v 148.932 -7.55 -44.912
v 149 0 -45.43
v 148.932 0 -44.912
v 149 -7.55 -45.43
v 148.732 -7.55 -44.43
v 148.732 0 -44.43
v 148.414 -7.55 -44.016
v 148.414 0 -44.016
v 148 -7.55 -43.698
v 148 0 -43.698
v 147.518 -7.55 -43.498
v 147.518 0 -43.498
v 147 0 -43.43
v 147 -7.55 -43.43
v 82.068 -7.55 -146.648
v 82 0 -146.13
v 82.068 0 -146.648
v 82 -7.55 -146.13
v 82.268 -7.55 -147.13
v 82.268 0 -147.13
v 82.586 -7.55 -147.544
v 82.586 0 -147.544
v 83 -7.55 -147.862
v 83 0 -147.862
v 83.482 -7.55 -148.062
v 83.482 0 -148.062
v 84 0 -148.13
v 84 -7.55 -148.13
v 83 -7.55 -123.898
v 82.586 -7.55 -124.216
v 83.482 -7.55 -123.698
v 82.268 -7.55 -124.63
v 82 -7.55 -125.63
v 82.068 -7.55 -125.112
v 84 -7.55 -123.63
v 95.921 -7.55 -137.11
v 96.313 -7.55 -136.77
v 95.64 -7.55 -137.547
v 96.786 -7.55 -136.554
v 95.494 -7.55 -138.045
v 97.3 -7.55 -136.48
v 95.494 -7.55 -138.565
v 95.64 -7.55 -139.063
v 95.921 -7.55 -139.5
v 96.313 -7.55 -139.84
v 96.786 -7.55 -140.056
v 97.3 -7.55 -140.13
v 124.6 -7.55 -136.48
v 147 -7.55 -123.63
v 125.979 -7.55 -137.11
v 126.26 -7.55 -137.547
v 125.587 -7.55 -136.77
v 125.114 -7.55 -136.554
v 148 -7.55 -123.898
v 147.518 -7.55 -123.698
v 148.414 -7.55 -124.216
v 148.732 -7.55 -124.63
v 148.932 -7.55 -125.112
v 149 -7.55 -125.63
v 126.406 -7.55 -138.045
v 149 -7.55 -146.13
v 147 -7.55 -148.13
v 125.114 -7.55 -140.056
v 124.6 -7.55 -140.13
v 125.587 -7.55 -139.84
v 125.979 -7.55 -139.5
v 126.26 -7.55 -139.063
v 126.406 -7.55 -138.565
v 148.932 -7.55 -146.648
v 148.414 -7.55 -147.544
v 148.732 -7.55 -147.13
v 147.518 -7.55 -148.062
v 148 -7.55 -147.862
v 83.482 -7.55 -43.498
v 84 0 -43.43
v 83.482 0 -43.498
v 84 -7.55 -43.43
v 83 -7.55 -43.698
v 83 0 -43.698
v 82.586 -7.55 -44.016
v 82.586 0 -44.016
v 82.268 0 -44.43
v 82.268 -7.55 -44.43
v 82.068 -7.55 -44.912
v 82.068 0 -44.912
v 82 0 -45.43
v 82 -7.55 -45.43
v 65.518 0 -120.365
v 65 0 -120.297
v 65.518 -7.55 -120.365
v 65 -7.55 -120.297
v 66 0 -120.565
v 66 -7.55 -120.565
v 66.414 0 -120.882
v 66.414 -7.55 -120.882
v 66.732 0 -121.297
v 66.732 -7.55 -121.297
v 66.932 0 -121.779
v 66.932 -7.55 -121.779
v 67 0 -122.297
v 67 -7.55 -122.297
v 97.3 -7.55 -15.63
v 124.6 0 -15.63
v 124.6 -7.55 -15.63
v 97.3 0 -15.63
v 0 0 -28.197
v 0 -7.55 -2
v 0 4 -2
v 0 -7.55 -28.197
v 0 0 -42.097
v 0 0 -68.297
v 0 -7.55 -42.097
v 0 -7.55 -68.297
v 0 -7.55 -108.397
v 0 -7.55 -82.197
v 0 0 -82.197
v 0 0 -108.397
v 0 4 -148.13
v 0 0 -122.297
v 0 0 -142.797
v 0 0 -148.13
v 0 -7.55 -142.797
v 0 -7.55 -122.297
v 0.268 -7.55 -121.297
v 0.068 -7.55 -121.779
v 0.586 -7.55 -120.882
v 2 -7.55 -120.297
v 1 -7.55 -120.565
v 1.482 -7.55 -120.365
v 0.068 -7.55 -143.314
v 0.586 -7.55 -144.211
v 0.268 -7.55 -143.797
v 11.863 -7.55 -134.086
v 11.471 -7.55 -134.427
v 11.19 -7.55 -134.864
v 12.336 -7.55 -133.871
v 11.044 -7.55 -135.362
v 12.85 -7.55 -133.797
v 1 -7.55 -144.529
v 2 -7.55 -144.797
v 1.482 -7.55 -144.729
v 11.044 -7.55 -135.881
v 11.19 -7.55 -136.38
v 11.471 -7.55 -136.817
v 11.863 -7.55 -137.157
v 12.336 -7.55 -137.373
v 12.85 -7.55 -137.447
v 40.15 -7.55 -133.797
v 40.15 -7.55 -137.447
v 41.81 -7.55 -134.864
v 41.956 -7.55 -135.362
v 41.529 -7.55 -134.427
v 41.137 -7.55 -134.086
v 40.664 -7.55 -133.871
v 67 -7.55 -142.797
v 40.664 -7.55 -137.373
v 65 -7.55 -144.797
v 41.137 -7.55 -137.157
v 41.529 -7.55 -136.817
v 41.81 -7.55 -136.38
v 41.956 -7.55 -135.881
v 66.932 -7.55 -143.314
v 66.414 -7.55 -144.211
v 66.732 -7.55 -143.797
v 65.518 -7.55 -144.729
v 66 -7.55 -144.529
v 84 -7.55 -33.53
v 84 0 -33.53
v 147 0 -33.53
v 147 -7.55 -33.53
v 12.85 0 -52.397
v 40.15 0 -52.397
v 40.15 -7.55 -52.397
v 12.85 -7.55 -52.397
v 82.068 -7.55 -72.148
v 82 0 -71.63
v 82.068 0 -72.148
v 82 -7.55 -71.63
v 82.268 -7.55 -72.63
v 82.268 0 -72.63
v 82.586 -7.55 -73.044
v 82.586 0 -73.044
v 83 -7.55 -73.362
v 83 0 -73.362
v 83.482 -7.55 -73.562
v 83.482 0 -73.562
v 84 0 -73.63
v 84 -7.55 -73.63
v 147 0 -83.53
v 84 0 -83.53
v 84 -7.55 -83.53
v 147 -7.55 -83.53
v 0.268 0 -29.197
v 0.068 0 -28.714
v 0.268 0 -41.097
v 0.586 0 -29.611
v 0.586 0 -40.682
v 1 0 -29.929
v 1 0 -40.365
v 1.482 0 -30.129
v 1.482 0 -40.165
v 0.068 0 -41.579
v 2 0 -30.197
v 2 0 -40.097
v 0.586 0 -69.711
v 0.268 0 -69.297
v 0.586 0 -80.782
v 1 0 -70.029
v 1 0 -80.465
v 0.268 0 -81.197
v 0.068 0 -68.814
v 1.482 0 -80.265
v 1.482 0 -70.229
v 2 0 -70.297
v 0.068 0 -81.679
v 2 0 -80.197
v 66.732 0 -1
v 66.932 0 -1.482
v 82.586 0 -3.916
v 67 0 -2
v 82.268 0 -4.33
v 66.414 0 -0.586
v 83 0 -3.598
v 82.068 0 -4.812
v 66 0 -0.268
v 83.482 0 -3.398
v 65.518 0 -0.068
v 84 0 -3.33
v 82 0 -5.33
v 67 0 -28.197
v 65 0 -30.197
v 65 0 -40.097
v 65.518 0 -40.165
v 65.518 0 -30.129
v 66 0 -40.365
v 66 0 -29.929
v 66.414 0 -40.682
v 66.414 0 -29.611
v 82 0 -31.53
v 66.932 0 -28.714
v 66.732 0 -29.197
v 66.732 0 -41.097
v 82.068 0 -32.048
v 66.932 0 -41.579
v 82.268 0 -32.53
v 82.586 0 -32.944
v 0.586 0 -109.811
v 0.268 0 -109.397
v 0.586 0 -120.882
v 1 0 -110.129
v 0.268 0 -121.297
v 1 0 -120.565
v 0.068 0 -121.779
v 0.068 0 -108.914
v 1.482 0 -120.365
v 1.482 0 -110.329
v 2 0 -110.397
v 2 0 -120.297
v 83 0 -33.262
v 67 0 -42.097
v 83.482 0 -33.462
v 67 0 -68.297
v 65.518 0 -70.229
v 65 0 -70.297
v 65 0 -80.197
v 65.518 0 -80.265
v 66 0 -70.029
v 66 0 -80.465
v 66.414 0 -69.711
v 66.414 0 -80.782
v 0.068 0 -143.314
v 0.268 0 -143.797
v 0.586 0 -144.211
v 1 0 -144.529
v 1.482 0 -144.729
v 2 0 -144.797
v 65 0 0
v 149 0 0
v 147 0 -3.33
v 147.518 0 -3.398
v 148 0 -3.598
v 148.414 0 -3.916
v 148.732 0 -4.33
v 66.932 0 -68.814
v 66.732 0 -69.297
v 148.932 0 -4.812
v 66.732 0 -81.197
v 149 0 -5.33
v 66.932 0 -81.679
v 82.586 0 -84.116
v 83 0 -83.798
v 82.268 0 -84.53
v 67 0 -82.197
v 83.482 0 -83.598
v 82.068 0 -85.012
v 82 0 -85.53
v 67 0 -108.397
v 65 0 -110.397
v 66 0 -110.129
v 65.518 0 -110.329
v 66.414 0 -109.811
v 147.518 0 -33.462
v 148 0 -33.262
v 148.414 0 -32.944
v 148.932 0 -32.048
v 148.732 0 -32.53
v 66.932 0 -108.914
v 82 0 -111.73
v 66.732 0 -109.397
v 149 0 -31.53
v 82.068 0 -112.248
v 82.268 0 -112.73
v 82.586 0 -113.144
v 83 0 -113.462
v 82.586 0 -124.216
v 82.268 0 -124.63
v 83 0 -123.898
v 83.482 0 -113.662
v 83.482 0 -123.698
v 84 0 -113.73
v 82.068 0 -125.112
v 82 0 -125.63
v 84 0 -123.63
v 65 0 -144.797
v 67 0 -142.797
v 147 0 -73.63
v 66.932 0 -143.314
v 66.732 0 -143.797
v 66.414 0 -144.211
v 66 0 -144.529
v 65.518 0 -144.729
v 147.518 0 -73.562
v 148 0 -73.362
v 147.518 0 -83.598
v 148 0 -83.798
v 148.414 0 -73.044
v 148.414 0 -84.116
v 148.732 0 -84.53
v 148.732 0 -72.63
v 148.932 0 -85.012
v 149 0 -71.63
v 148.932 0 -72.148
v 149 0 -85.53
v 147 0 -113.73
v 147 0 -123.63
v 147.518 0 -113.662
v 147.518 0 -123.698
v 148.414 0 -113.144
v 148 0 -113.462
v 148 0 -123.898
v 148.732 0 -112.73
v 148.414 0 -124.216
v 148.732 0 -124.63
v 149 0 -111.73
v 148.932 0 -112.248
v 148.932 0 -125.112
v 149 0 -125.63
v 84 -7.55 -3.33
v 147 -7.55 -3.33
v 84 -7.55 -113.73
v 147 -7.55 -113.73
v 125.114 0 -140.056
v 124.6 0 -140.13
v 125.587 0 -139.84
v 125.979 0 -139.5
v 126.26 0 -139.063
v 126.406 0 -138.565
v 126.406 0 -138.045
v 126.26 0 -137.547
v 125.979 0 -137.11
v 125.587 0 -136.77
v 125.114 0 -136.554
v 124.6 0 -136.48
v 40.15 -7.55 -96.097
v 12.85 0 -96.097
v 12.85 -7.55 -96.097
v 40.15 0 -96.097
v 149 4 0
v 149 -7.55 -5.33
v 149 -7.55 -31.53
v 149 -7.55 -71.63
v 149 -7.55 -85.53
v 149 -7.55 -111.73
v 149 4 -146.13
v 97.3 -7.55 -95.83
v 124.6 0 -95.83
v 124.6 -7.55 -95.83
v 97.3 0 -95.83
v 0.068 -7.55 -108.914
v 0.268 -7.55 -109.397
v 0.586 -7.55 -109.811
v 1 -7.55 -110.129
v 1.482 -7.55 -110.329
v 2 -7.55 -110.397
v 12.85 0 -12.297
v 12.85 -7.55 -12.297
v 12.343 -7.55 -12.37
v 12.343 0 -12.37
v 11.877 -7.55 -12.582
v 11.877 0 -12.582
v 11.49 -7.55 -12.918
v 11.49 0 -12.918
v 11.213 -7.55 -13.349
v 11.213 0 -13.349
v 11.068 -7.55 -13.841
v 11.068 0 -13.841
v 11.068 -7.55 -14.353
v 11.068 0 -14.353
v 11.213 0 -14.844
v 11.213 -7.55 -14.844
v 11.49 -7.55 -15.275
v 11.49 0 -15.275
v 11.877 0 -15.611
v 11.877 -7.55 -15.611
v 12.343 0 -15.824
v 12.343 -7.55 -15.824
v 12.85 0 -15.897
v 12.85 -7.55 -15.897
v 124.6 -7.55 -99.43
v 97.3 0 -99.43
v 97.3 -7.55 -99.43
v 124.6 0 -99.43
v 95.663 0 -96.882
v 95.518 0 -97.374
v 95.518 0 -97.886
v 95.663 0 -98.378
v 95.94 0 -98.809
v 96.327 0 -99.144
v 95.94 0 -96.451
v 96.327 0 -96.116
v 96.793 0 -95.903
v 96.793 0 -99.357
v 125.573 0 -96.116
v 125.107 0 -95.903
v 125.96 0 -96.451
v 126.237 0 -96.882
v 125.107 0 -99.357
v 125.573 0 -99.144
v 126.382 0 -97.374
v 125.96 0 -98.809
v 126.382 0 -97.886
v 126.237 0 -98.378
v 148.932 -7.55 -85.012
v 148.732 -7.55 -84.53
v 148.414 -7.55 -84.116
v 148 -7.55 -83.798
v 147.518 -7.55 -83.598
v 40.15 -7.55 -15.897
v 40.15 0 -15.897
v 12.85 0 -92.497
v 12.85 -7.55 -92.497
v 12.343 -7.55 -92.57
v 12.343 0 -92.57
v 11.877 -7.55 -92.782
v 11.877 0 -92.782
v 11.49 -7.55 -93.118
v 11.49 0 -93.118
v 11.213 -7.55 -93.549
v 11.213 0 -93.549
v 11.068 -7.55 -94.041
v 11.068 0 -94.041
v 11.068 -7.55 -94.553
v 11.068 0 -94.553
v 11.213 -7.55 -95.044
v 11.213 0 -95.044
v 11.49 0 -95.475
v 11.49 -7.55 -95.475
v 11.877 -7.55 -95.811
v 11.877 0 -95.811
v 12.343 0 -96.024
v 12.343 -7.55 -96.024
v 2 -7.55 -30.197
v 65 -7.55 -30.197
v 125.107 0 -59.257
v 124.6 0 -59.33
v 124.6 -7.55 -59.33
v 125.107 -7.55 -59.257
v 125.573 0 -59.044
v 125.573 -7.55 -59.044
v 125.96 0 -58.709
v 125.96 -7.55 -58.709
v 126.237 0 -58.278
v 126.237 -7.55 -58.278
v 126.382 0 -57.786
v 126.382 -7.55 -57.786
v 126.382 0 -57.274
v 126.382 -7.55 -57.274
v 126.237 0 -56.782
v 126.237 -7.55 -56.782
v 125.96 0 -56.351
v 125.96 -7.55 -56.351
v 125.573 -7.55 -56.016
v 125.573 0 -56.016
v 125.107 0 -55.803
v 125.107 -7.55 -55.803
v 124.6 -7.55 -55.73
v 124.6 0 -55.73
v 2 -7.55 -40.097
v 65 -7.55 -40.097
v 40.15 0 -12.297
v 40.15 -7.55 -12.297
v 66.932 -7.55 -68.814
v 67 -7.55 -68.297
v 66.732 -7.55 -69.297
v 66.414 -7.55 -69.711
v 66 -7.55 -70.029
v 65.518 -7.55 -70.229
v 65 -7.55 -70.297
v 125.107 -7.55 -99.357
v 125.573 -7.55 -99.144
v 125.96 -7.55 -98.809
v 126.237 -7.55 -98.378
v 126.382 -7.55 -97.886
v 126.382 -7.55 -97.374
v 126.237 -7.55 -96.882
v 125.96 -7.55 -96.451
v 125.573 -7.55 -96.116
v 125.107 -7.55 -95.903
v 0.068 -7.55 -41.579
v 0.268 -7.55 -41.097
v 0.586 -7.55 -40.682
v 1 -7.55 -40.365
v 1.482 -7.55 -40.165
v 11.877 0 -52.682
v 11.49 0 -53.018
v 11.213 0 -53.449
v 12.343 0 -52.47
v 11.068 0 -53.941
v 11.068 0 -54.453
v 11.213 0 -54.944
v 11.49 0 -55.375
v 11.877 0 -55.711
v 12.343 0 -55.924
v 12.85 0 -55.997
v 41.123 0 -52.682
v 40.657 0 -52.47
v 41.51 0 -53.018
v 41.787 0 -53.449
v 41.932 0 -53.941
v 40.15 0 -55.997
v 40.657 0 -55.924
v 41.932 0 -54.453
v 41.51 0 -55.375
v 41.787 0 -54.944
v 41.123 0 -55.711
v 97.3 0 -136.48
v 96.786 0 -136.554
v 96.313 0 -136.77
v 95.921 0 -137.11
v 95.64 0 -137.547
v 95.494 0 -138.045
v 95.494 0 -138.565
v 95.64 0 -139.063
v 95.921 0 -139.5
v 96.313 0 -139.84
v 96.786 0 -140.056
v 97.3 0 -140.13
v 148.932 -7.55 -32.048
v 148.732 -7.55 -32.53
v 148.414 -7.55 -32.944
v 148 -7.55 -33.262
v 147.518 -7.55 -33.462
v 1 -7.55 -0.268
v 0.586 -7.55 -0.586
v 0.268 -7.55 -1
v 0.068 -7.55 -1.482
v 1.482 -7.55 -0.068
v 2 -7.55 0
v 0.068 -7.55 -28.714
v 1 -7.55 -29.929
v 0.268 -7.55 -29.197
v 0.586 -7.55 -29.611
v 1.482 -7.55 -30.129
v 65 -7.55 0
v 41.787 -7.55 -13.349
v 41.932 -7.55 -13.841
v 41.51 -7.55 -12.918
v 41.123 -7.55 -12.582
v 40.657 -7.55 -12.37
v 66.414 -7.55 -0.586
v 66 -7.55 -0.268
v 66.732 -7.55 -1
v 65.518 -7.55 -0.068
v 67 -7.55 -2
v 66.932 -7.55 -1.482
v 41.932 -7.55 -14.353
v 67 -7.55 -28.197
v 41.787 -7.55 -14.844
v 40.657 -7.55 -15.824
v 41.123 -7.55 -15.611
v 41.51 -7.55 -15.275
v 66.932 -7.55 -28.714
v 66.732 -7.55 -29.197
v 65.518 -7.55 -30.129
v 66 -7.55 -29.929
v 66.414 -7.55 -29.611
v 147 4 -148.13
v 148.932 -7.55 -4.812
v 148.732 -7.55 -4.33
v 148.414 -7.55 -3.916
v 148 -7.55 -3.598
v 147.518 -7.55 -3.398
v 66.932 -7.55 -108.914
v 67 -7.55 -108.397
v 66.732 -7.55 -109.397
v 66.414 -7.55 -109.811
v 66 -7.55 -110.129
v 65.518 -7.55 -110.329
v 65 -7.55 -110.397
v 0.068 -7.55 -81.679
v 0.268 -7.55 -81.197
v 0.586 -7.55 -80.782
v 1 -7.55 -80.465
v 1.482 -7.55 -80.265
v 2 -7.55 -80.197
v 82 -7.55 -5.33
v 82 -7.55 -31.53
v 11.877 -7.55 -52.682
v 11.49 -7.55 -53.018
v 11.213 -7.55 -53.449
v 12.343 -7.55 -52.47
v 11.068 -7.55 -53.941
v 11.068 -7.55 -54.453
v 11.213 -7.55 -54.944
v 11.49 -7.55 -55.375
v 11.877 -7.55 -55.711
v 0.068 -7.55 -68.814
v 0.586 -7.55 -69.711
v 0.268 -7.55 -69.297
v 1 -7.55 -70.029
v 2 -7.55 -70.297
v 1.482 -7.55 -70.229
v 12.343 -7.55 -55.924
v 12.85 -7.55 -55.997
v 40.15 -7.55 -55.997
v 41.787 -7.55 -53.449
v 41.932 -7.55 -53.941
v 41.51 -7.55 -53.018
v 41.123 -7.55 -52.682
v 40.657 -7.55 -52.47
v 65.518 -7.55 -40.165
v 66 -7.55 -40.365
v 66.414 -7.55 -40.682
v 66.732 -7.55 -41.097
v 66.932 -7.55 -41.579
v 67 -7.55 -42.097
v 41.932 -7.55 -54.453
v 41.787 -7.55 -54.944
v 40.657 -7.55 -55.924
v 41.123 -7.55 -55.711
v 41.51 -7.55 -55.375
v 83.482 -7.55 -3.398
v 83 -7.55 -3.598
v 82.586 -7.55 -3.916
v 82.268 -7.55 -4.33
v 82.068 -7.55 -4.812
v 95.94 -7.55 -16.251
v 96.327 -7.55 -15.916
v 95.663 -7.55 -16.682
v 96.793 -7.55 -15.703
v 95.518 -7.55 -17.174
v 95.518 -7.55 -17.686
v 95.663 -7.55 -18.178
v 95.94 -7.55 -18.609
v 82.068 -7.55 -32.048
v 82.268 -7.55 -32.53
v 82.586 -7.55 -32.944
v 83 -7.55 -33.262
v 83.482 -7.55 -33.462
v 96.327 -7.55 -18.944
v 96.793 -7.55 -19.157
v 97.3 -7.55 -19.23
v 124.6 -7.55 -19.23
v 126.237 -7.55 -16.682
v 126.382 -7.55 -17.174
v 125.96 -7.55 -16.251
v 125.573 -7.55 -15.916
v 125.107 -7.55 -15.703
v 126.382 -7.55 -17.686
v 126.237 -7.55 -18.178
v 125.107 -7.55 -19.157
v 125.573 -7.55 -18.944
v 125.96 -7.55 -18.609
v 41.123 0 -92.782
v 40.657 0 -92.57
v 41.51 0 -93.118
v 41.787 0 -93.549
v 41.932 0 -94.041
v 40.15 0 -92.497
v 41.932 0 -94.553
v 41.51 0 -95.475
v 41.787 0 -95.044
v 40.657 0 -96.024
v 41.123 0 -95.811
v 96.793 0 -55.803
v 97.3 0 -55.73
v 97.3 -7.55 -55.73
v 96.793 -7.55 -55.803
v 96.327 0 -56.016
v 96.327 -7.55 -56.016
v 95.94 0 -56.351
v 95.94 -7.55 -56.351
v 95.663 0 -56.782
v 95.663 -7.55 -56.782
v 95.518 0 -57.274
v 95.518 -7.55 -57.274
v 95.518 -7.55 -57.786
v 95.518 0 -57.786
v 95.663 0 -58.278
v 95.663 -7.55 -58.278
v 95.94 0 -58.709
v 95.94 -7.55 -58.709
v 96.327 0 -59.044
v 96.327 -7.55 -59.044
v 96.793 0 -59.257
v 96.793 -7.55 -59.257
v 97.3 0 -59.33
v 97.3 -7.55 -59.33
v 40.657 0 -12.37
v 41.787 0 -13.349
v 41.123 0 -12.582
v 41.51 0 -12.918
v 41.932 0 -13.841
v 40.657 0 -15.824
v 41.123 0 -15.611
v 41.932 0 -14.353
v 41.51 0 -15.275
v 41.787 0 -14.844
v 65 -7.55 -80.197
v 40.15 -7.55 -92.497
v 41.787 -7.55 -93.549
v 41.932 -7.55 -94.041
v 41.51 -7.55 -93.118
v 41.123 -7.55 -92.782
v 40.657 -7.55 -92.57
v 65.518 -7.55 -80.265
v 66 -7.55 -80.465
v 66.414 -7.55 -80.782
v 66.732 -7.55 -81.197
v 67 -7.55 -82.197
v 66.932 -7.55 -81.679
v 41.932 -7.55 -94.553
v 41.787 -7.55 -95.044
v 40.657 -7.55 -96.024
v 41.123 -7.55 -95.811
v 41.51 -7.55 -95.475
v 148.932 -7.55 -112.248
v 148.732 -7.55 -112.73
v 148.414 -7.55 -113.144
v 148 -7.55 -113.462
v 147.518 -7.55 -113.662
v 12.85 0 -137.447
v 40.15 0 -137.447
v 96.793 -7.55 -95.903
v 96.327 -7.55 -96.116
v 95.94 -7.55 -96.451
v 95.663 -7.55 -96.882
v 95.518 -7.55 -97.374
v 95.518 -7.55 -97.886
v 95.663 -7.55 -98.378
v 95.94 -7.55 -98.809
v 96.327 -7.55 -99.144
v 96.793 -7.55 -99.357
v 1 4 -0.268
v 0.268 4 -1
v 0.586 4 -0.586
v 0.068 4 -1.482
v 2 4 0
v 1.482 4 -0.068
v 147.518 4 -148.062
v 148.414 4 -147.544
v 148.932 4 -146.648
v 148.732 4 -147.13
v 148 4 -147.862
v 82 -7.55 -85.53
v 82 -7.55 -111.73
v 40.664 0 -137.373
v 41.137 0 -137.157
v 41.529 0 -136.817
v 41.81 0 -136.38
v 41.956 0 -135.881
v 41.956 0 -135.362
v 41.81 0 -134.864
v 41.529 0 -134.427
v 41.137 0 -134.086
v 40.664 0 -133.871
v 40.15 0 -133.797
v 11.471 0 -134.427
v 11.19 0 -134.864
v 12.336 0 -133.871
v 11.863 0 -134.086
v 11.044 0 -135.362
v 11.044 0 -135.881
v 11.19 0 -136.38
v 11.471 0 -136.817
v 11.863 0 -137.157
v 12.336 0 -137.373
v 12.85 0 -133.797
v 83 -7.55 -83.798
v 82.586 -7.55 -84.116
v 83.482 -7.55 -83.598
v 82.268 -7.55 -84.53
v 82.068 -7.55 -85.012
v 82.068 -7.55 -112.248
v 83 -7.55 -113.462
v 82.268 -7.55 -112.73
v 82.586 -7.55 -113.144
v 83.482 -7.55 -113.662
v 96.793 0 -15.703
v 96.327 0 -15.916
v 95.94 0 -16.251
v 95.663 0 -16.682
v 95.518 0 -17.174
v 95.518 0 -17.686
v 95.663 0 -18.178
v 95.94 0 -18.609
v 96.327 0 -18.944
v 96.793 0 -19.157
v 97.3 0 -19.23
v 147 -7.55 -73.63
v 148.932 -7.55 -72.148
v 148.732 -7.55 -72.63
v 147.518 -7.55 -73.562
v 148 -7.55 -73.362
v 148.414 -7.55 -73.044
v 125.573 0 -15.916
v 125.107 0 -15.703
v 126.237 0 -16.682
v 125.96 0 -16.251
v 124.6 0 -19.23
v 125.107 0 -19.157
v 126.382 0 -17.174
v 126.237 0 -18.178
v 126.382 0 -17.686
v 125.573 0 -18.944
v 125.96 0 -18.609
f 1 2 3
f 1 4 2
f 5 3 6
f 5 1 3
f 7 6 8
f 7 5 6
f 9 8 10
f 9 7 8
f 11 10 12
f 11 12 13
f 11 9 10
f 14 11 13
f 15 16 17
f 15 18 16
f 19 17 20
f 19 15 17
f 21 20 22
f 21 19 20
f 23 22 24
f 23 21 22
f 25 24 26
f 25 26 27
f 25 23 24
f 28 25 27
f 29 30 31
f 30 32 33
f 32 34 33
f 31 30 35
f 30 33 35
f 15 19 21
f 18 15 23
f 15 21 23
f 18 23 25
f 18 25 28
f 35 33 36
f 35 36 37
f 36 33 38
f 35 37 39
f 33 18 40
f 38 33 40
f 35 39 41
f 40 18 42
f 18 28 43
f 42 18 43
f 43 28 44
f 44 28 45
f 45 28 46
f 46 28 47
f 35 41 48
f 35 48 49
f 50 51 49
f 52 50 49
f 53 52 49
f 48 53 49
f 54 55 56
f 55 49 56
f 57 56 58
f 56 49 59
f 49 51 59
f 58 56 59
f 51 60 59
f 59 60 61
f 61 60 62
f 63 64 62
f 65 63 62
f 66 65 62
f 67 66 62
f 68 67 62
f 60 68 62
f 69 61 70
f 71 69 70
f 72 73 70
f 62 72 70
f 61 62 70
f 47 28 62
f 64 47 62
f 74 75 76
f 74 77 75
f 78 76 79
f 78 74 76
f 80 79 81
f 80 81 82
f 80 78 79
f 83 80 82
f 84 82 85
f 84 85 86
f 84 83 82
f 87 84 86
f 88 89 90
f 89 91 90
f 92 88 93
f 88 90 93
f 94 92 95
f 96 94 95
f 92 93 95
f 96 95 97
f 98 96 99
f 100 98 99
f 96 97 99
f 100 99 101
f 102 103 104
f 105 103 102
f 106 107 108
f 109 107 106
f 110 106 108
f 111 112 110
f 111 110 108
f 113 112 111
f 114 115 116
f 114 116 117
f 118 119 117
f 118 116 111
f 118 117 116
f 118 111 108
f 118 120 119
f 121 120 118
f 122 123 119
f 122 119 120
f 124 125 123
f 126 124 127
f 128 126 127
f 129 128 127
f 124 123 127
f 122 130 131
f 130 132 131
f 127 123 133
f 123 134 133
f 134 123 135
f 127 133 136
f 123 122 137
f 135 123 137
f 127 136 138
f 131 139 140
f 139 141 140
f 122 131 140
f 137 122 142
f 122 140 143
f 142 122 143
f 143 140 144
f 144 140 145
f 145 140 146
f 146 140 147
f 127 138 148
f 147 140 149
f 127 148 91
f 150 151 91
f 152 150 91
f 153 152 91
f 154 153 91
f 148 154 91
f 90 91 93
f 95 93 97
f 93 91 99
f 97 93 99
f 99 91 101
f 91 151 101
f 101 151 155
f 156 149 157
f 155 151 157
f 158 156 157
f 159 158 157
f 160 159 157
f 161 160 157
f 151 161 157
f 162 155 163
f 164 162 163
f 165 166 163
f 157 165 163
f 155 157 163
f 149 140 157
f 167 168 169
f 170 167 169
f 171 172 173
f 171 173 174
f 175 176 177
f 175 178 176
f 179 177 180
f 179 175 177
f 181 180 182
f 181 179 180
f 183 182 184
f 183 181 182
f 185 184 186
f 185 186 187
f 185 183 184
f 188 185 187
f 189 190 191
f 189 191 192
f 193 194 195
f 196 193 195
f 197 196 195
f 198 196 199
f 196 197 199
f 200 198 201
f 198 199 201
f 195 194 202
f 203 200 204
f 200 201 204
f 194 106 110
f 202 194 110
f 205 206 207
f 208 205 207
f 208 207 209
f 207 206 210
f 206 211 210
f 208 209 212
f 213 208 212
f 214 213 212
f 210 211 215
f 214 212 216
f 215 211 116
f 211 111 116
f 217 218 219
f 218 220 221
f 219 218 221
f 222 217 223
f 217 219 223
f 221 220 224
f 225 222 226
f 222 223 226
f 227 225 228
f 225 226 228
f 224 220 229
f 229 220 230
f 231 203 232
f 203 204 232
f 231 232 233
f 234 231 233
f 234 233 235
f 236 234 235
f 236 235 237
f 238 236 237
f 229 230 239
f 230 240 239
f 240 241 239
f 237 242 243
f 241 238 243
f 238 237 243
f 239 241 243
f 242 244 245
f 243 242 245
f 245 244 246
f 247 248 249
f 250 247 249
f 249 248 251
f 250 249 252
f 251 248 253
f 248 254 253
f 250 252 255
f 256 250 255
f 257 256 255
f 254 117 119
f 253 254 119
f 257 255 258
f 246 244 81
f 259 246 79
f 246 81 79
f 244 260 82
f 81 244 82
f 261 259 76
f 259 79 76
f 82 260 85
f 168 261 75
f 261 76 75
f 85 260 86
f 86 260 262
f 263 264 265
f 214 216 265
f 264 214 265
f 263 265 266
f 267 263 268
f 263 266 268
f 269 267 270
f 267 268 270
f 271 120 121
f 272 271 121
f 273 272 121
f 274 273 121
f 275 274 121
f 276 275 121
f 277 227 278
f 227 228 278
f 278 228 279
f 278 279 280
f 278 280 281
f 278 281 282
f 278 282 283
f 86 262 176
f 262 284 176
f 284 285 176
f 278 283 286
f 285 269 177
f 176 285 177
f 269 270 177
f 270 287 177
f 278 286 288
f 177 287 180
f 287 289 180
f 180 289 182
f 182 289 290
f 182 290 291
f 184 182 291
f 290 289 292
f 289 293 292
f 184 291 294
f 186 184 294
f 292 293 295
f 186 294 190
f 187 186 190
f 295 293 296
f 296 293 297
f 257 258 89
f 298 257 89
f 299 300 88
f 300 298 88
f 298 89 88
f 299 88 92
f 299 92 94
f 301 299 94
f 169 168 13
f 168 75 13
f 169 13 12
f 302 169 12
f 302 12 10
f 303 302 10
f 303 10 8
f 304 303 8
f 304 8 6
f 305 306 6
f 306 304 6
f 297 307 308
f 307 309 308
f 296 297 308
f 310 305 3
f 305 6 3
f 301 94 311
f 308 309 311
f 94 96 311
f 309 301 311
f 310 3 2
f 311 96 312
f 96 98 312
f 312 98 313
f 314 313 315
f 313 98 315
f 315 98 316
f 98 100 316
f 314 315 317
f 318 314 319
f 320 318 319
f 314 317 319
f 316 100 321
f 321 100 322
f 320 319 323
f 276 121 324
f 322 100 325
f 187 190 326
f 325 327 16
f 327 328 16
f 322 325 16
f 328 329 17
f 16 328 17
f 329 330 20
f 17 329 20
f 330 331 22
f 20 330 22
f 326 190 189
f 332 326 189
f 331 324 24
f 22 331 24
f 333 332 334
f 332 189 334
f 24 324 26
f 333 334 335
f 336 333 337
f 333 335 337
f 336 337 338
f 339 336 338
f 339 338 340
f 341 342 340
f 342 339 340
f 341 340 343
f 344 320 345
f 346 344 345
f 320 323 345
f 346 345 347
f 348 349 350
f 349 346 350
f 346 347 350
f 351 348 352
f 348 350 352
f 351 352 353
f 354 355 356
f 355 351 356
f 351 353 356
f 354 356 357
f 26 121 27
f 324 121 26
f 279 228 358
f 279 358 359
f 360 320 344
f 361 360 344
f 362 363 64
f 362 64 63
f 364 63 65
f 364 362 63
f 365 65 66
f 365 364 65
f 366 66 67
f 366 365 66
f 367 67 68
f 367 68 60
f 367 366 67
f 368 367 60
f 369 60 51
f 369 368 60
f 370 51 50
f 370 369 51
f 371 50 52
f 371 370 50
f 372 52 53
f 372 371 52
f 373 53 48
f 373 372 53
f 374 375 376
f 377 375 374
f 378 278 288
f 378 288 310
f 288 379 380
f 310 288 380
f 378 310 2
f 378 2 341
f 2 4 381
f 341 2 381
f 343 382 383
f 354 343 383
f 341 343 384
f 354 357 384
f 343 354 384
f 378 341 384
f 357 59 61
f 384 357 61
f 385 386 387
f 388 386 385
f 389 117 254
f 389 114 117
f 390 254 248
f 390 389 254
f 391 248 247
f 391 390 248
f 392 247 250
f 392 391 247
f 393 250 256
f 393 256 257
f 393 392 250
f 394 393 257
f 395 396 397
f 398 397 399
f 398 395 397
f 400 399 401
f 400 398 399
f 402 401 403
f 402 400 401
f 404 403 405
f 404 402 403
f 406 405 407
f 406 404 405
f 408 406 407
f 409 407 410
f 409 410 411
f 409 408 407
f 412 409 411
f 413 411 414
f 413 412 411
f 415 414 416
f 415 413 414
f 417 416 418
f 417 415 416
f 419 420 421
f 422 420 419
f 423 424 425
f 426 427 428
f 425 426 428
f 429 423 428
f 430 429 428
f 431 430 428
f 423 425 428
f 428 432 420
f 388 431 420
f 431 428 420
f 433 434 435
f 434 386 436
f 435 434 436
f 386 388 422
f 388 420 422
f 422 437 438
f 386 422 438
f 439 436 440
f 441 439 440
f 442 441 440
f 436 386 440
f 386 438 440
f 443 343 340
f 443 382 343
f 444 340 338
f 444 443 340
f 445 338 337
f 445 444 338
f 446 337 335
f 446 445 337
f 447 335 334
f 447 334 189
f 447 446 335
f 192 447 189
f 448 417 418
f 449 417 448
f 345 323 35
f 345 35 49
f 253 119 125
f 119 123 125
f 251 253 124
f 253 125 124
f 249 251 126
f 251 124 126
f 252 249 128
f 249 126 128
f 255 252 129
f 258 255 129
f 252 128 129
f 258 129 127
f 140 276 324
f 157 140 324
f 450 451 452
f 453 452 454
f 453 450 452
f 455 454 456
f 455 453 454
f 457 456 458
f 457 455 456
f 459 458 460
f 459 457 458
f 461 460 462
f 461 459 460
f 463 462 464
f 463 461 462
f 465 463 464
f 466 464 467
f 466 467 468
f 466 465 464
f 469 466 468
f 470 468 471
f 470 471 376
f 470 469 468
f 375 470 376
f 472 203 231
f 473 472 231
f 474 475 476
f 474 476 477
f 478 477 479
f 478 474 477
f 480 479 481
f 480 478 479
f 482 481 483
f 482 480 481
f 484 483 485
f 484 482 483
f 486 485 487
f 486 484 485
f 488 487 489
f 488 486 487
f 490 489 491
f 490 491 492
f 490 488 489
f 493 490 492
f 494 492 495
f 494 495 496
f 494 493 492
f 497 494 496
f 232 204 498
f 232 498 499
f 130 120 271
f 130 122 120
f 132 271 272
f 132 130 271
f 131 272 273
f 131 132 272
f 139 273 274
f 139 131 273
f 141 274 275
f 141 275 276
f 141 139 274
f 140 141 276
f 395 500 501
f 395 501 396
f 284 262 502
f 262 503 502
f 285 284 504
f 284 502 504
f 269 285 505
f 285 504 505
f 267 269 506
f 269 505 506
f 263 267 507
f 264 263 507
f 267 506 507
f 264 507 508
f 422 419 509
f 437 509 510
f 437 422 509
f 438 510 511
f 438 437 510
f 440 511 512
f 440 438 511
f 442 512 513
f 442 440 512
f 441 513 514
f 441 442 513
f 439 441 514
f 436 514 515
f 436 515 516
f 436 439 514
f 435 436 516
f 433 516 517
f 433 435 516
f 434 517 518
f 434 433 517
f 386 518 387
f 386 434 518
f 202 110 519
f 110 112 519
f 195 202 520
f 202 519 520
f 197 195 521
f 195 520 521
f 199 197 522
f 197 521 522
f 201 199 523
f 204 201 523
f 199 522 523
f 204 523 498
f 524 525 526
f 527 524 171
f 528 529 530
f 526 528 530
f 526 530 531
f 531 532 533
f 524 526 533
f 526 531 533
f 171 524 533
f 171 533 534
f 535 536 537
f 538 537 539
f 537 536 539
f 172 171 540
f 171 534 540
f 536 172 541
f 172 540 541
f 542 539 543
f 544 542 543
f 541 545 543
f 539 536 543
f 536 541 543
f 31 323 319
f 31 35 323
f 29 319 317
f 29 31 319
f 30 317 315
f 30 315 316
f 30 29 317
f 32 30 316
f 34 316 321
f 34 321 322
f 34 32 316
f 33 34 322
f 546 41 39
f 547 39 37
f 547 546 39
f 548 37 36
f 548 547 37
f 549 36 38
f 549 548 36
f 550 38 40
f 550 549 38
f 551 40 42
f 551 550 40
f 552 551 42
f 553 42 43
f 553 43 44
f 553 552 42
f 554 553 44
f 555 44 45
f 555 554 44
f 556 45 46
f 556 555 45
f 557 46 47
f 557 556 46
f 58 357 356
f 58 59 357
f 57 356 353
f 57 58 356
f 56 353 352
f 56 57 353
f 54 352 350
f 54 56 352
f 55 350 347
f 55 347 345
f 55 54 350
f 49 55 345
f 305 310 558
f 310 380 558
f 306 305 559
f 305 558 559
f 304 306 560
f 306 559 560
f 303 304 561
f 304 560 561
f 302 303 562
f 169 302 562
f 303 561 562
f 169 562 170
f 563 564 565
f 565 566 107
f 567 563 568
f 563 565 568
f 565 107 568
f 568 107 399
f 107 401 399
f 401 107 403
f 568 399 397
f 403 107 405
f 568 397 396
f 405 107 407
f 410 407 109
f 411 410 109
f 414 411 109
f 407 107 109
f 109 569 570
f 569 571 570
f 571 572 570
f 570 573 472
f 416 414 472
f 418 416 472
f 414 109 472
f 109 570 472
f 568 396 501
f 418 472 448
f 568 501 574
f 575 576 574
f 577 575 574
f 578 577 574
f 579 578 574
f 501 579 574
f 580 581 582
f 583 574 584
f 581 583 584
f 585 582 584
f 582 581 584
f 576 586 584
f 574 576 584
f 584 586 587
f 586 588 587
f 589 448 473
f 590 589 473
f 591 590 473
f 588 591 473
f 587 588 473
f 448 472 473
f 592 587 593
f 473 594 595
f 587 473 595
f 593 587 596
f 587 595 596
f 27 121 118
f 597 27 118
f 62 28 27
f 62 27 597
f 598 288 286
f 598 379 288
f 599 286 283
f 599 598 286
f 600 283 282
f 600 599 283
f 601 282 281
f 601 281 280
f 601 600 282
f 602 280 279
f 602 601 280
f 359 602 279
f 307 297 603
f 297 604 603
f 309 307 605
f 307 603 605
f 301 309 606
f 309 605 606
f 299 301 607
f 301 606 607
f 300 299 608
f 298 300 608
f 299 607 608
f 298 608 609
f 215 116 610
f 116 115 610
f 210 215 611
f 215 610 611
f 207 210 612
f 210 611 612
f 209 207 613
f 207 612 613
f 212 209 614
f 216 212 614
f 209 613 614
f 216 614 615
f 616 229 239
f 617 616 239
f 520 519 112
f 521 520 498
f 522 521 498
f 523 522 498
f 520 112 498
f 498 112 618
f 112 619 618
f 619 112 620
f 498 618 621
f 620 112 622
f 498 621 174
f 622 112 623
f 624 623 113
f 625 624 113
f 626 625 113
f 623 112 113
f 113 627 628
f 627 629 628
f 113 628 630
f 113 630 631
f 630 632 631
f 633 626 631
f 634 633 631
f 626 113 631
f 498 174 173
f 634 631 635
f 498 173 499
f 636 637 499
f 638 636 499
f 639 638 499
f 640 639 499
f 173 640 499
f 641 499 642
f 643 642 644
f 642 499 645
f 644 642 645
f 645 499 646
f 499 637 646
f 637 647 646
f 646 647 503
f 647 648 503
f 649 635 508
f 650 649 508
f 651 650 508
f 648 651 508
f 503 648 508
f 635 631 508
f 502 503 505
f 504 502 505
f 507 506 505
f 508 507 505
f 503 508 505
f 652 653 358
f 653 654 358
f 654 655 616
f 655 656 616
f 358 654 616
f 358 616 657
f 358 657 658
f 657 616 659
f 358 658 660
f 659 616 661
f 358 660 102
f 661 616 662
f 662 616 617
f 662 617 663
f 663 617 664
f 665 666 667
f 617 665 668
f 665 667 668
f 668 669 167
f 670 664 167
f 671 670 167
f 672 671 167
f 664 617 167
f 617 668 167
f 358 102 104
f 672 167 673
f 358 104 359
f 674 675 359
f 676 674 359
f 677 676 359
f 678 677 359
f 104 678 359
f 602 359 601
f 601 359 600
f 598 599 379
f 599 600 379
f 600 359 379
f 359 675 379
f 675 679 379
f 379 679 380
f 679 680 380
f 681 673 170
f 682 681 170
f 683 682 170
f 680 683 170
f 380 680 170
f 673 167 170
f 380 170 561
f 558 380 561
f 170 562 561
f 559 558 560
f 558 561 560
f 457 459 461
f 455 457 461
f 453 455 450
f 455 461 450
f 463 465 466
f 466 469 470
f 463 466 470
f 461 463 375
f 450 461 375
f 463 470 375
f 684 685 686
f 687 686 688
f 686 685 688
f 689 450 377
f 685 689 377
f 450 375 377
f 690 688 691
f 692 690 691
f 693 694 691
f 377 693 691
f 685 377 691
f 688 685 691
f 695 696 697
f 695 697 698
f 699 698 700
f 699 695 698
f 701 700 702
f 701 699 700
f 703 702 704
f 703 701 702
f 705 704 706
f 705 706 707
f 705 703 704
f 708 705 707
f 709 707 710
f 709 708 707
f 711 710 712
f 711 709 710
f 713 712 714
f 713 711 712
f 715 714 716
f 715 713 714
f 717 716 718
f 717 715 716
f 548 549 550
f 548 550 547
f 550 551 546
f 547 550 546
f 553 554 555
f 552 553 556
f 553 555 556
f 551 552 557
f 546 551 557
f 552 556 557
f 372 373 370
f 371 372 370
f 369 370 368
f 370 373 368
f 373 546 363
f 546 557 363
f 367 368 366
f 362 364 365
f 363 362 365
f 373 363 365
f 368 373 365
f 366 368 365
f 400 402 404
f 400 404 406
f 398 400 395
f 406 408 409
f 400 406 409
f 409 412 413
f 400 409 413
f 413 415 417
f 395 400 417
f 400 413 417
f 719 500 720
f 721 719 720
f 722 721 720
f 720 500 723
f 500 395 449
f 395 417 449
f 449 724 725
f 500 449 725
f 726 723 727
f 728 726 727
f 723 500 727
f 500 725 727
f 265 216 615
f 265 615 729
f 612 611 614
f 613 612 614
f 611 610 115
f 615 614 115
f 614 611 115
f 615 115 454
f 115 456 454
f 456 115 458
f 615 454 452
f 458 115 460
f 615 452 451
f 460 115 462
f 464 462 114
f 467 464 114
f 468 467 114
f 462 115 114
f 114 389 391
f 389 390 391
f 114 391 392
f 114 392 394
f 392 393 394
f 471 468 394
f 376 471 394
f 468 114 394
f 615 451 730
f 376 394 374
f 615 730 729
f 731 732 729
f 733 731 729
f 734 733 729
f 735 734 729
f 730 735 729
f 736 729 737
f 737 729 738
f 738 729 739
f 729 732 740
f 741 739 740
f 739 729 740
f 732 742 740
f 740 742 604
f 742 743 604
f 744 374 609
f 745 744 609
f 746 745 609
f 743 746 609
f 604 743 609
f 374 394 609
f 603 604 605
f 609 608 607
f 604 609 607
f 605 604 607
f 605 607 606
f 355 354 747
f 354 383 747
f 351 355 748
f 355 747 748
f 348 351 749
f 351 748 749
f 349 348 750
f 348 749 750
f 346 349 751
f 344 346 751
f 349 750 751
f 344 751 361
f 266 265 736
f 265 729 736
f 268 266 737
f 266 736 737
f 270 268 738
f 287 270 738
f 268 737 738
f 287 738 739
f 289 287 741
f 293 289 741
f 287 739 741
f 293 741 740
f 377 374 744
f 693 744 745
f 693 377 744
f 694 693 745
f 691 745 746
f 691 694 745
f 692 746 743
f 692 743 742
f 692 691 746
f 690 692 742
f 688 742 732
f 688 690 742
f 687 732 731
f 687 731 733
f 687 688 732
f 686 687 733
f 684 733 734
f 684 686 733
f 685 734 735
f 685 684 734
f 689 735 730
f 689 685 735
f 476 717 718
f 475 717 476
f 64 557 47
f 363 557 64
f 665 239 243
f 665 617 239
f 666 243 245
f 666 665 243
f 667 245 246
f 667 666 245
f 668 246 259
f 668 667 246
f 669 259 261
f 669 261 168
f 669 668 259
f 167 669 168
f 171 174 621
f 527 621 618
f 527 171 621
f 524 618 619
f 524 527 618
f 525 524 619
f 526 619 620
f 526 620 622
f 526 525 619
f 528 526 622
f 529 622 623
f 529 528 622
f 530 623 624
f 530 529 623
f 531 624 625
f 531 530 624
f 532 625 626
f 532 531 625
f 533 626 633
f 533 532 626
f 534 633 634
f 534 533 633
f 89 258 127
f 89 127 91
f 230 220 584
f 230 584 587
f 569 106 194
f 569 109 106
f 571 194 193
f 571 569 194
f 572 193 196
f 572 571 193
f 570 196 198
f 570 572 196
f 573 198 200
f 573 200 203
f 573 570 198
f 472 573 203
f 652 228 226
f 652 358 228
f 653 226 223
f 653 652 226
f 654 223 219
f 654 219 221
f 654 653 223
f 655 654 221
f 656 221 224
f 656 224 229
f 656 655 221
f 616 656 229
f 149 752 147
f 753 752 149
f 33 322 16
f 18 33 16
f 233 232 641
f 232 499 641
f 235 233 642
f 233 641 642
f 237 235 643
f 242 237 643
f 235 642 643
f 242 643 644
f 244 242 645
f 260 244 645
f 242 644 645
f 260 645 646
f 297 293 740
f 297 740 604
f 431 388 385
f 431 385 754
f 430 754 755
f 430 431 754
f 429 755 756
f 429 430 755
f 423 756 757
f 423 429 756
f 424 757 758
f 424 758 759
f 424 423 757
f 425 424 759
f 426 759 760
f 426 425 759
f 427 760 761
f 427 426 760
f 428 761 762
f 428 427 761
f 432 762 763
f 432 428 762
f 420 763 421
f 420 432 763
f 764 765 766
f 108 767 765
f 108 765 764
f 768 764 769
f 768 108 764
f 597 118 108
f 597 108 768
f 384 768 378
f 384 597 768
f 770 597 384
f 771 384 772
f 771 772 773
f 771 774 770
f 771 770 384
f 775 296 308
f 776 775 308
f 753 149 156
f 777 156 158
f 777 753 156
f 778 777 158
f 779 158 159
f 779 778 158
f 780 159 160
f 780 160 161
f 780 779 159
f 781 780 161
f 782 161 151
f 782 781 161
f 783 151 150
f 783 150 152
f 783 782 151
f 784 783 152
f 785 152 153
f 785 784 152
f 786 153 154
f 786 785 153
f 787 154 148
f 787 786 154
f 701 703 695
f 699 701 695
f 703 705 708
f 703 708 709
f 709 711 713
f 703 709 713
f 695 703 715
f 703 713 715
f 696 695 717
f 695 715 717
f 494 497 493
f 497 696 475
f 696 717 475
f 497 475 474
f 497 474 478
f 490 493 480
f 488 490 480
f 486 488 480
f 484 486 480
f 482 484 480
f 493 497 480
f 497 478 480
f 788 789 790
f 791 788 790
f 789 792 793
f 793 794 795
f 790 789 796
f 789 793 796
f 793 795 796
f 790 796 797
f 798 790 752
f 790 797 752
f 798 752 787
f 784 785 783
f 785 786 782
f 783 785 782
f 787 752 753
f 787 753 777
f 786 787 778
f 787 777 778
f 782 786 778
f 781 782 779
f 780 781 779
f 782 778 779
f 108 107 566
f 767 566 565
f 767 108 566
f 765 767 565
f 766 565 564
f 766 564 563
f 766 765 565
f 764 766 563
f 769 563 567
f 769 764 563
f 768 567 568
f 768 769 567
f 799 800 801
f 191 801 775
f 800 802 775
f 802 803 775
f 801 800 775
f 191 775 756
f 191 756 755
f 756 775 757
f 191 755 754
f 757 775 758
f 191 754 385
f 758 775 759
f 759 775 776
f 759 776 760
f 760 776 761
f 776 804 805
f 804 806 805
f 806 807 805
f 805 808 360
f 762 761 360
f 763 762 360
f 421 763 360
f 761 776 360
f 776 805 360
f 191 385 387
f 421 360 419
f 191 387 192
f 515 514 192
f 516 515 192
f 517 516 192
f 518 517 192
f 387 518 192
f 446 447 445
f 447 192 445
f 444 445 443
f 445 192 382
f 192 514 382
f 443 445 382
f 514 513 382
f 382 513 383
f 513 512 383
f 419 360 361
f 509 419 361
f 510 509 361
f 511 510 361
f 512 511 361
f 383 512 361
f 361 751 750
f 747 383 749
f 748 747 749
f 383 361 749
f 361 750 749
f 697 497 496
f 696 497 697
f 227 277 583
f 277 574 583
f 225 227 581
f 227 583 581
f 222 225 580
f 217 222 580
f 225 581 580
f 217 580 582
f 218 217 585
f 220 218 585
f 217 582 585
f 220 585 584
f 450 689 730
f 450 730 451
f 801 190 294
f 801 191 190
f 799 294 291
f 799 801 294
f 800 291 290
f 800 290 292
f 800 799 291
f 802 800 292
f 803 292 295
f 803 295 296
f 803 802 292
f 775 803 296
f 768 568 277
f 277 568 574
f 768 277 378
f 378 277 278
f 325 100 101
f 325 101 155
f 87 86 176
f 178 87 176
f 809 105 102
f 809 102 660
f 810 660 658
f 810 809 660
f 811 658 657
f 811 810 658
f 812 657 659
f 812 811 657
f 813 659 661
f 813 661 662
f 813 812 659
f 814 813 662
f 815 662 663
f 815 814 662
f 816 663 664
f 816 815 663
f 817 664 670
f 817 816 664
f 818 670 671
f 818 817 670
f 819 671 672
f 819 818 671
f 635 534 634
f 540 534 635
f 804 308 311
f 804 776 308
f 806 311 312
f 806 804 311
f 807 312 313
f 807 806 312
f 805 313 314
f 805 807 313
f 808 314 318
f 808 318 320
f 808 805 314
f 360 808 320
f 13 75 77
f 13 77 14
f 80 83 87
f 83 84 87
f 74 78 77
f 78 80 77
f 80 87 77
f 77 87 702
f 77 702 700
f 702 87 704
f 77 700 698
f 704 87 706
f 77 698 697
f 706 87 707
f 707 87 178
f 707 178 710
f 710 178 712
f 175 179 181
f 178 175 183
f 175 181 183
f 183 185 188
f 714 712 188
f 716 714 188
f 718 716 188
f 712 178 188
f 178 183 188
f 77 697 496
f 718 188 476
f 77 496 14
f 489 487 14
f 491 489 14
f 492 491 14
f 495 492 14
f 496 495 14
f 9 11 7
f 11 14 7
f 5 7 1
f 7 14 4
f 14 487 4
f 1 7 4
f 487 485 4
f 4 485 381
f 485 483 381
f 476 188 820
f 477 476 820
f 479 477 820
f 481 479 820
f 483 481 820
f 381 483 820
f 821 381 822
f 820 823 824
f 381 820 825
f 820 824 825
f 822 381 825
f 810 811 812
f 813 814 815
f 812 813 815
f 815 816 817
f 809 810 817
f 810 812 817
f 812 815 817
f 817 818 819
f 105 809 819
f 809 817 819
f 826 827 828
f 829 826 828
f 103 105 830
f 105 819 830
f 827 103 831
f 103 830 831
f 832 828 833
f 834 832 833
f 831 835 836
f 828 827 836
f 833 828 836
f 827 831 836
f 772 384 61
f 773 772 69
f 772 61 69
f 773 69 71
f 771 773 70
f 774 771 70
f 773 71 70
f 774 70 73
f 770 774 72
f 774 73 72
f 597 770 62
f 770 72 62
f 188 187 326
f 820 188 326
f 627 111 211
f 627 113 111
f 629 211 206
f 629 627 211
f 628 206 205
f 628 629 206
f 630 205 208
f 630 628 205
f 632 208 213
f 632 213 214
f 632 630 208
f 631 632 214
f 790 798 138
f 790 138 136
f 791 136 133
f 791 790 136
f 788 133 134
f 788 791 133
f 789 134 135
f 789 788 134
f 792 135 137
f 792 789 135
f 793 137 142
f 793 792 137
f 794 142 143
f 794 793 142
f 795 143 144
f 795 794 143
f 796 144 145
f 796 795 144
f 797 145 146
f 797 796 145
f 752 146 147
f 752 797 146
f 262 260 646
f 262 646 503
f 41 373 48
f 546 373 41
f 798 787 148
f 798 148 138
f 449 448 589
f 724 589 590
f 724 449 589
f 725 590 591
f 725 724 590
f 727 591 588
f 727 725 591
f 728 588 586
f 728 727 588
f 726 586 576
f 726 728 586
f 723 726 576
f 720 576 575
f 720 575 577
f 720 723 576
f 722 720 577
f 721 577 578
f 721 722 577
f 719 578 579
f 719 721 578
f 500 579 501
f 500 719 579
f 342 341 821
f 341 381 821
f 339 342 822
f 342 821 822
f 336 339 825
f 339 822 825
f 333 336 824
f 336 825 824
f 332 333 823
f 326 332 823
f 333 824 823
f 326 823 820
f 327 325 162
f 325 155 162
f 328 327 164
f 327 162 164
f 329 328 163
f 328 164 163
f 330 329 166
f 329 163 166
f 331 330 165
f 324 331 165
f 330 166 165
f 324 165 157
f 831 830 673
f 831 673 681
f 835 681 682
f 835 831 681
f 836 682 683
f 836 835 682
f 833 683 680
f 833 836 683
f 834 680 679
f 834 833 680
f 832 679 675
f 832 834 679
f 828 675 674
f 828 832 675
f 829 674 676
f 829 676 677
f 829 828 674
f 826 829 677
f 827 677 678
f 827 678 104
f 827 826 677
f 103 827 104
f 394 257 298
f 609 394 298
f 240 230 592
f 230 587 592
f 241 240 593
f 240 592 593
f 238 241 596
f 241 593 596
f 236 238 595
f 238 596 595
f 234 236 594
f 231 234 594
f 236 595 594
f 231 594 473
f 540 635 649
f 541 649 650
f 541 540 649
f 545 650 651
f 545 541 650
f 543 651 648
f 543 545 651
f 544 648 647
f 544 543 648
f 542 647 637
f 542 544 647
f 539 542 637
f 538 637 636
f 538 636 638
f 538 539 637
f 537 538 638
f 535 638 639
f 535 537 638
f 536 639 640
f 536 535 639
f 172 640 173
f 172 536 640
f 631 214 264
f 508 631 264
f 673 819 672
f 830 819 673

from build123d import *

# Parameters (mm, degrees)
SKETCH2_W           = 149
SKETCH2_H           = 148.13
BOSS_EXTRUDE1_DEPTH = 4
SKETCH3_W           = 67
SKETCH3_H           = 24.5
SKETCH3_H_2         = 30.2
SKETCH3_H_3         = 30.1967
BOSS_EXTRUDE3_DEPTH = 11.55
FILLET1_R           = 2


with BuildPart() as part:
    # Sketch2 → Boss-Extrude1 (new body)
    with BuildSketch(Plane(origin=(0, 0, 0), x_dir=(1, 0, 0), z_dir=(0, 1, 0))):
        with Locations((74.5, 74.065)):
            Rectangle(SKETCH2_W, SKETCH2_H)
    extrude(amount=BOSS_EXTRUDE1_DEPTH)

    # Sketch3 → Boss-Extrude3 (add)
    # profile 1 of 8: a face of its own
    with BuildSketch(Plane(origin=(0, 4, 0), x_dir=(1, 0, 0), z_dir=(0, 1, 0))):
        with Locations((33.5, 132.5467)):
            Rectangle(SKETCH3_W, SKETCH3_H)
        with BuildLine():
            ThreePointArc((12.85, 133.7967), (11.025, 135.6217), (12.85, 137.4467))
            Line((12.85, 137.4467), (40.15, 137.4467))
            ThreePointArc((40.15, 137.4467), (41.975, 135.6217), (40.15, 133.7967))
            Line((40.15, 133.7967), (12.85, 133.7967))
        make_face(mode=Mode.SUBTRACT)
    # profile 2 of 8: a face of its own
    with BuildSketch(Plane(origin=(0, 4, 0), x_dir=(1, 0, 0), z_dir=(0, 1, 0))):
        with Locations((115.5, 135.88)):
            Rectangle(SKETCH3_W, SKETCH3_H)
        with BuildLine():
            ThreePointArc((97.3, 136.48), (95.475, 138.305), (97.3, 140.13))
            Line((97.3, 140.13), (124.6, 140.13))
            ThreePointArc((124.6, 140.13), (126.425, 138.305), (124.6, 136.48))
            Line((124.6, 136.48), (97.3, 136.48))
        make_face(mode=Mode.SUBTRACT)
    # profile 3 of 8: a face of its own
    with BuildSketch(Plane(origin=(0, 4, 0), x_dir=(1, 0, 0), z_dir=(0, 1, 0))):
        with Locations((33.5, 95.2967)):
            Rectangle(SKETCH3_W, SKETCH3_H_2)
        with BuildLine():
            ThreePointArc((12.85, 92.4967), (11.05, 94.2967), (12.85, 96.0967))
            Line((12.85, 96.0967), (40.15, 96.0967))
            ThreePointArc((40.15, 96.0967), (41.95, 94.2967), (40.15, 92.4967))
            Line((40.15, 92.4967), (12.85, 92.4967))
        make_face(mode=Mode.SUBTRACT)
    # profile 4 of 8: a face of its own
    with BuildSketch(Plane(origin=(0, 4, 0), x_dir=(1, 0, 0), z_dir=(0, 1, 0))):
        with Locations((115.5, 98.63)):
            Rectangle(SKETCH3_W, SKETCH3_H_2)
        with BuildLine():
            ThreePointArc((97.3, 95.83), (95.5, 97.63), (97.3, 99.43))
            Line((97.3, 99.43), (124.6, 99.43))
            ThreePointArc((124.6, 99.43), (126.4, 97.63), (124.6, 95.83))
            Line((124.6, 95.83), (97.3, 95.83))
        make_face(mode=Mode.SUBTRACT)
    # profile 5 of 8: a face of its own
    with BuildSketch(Plane(origin=(0, 4, 0), x_dir=(1, 0, 0), z_dir=(0, 1, 0))):
        with Locations((33.5, 55.1967)):
            Rectangle(SKETCH3_W, SKETCH3_H_2)
        with BuildLine():
            ThreePointArc((12.85, 52.3967), (11.05, 54.1967), (12.85, 55.9967))
            Line((12.85, 55.9967), (40.15, 55.9967))
            ThreePointArc((40.15, 55.9967), (41.95, 54.1967), (40.15, 52.3967))
            Line((40.15, 52.3967), (12.85, 52.3967))
        make_face(mode=Mode.SUBTRACT)
    # profile 6 of 8: a face of its own
    with BuildSketch(Plane(origin=(0, 4, 0), x_dir=(1, 0, 0), z_dir=(0, 1, 0))):
        with Locations((115.5, 58.53)):
            Rectangle(SKETCH3_W, SKETCH3_H_2)
        with BuildLine():
            ThreePointArc((97.3, 55.73), (95.5, 57.53), (97.3, 59.33))
            Line((97.3, 59.33), (124.6, 59.33))
            ThreePointArc((124.6, 59.33), (126.4, 57.53), (124.6, 55.73))
            Line((124.6, 55.73), (97.3, 55.73))
        make_face(mode=Mode.SUBTRACT)
    # profile 7 of 8: a face of its own
    with BuildSketch(Plane(origin=(0, 4, 0), x_dir=(1, 0, 0), z_dir=(0, 1, 0))):
        with Locations((33.5, 15.09835)):
            Rectangle(SKETCH3_W, SKETCH3_H_3)
        with BuildLine():
            ThreePointArc((12.85, 12.2967), (11.05, 14.0967), (12.85, 15.8967))
            Line((12.85, 15.8967), (40.15, 15.8967))
            ThreePointArc((40.15, 15.8967), (41.95, 14.0967), (40.15, 12.2967))
            Line((40.15, 12.2967), (12.85, 12.2967))
        make_face(mode=Mode.SUBTRACT)
    # profile 8 of 8: a face of its own
    with BuildSketch(Plane(origin=(0, 4, 0), x_dir=(1, 0, 0), z_dir=(0, 1, 0))):
        with Locations((115.5, 18.43)):
            Rectangle(SKETCH3_W, SKETCH3_H_2)
        with BuildLine():
            ThreePointArc((97.3, 15.63), (95.5, 17.43), (97.3, 19.23))
            Line((97.3, 19.23), (124.6, 19.23))
            ThreePointArc((124.6, 19.23), (126.4, 17.43), (124.6, 15.63))
            Line((124.6, 15.63), (97.3, 15.63))
        make_face(mode=Mode.SUBTRACT)
    extrude(amount=-BOSS_EXTRUDE3_DEPTH)

    # Fillet1
    fillet1_edges = [part.edges().sort_by_distance(p)[0] for p in [
        (67, -3.775, -110.3967),
        (67, -3.775, -80.1967),
        (0, -3.775, -80.1967),
        (0, -3.775, -110.3967),
        (82, -3.775, -113.73),
        (149, -3.775, -113.73),
        (149, -3.775, -83.53),
        (82, -3.775, -83.53),
        (67, -3.775, -70.2967),
        (67, -3.775, -40.0967),
        (0, -3.775, -40.0967),
        (0, -3.775, -70.2967),
        (82, -3.775, -73.63),
        (149, -3.775, -73.63),
        (149, -3.775, -43.43),
        (82, -3.775, -43.43),
        (67, -3.775, -30.1967),
        (67, -3.775, 0),
        (0, -3.775, -30.1967),
        (67, -3.775, -144.7967),
        (67, -3.775, -120.2967),
        (0, -3.775, -120.2967),
        (0, -3.775, -144.7967),
        (82, -3.775, -33.53),
        (149, -3.775, -33.53),
        (149, -3.775, -3.33),
        (82, -3.775, -3.33),
        (82, -3.775, -148.13),
        (149, -3.775, -123.63),
        (82, -3.775, -123.63),
        (149, -1.775, -148.13),
        (0, -1.775, 0),
    ]]
    fillet(fillet1_edges, radius=FILLET1_R)


solid = part.part
